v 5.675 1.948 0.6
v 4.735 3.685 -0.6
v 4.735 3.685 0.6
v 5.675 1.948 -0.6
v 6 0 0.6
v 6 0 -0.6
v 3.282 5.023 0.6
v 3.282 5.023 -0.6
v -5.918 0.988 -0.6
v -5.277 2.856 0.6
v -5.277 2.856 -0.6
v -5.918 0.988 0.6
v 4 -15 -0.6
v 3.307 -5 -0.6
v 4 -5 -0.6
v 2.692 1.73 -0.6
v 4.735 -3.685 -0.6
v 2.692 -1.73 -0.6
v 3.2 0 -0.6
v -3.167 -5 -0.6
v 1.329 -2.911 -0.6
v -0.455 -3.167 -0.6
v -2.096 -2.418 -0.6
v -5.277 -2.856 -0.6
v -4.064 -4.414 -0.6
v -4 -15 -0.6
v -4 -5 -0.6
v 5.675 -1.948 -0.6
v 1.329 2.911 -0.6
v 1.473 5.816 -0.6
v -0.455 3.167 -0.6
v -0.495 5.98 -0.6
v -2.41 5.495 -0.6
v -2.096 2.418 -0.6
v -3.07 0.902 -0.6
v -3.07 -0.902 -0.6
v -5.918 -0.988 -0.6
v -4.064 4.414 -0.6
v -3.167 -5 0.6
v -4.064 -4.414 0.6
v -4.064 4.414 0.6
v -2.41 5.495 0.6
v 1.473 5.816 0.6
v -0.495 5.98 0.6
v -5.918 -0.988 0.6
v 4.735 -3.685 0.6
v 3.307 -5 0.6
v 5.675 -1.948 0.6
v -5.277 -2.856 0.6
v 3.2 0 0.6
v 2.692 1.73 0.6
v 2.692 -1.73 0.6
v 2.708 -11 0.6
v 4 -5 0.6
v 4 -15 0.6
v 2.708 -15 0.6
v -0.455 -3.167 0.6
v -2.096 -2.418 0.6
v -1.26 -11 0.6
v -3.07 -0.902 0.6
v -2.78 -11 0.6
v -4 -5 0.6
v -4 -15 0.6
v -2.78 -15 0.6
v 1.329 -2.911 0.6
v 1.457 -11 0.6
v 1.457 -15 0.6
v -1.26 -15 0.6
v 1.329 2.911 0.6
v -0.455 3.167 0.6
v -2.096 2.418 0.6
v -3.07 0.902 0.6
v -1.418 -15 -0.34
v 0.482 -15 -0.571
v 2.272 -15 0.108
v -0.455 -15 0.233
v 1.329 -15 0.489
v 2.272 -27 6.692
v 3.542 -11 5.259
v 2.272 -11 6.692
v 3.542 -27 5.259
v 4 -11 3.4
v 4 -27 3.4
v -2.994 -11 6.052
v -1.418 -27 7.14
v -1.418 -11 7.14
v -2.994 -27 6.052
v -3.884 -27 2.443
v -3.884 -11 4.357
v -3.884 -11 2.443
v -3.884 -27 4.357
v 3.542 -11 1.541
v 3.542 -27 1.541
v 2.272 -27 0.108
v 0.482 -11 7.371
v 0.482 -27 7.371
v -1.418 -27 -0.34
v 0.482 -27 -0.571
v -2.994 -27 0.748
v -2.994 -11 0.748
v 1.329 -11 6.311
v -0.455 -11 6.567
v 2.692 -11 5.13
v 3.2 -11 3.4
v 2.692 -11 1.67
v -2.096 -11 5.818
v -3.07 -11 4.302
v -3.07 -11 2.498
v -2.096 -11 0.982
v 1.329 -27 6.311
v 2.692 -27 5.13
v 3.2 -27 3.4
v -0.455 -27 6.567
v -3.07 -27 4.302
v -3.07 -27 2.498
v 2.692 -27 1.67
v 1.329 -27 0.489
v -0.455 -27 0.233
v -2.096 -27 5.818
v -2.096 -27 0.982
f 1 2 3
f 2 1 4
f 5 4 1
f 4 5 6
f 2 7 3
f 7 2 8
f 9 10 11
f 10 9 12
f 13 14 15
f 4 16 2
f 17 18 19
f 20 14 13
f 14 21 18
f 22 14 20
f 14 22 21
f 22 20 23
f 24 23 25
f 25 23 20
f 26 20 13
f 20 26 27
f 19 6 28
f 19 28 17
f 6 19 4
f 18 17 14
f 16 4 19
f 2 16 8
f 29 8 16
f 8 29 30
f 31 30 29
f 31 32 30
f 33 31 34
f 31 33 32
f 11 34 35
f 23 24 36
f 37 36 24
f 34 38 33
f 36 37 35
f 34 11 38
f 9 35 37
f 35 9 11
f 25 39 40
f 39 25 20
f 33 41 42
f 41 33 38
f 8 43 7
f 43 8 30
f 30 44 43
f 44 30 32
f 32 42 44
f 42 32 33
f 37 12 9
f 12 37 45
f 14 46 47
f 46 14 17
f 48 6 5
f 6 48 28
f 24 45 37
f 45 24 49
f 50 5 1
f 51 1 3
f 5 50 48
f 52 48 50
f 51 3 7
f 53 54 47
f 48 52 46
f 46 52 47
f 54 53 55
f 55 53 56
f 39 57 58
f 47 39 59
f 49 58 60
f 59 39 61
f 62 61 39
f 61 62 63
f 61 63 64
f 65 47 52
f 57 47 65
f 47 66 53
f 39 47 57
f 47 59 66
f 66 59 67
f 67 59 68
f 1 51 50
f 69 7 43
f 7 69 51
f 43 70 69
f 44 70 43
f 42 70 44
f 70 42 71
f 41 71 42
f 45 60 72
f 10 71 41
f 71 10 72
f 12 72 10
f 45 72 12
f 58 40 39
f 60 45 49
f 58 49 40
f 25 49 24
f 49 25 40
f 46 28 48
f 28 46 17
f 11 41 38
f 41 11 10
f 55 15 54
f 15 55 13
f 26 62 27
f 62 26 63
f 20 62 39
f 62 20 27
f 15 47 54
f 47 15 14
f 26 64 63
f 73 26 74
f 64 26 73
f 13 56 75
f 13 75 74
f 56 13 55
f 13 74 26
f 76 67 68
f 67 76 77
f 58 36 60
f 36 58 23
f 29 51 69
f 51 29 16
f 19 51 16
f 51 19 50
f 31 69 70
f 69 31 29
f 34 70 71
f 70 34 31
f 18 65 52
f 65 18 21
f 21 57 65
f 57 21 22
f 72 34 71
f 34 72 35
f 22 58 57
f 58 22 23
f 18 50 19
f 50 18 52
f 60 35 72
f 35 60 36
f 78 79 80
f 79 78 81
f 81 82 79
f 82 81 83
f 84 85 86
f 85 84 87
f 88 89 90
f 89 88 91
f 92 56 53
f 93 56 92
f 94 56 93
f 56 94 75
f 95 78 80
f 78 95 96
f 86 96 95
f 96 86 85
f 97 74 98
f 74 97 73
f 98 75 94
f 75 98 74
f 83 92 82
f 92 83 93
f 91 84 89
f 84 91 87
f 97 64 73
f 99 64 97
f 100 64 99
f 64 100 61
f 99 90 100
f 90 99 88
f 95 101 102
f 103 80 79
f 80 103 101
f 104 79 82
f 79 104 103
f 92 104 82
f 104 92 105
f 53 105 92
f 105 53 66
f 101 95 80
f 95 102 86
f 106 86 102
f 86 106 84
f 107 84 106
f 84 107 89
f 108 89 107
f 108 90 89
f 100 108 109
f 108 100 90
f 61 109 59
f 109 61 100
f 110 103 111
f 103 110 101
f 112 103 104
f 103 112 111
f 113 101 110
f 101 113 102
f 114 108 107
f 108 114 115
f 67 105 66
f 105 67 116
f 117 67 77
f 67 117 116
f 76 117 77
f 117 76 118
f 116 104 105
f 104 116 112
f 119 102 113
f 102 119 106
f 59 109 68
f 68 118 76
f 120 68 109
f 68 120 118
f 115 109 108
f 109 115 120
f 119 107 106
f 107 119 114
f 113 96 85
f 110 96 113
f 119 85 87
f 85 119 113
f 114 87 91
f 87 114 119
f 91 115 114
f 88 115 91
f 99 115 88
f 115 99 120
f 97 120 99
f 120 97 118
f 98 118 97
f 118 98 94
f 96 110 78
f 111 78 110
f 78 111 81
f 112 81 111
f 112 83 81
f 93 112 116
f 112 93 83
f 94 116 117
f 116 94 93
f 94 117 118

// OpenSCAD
// Parameters
outer_diameter_od = 12; //[6:24:0.5]
inner_diameter_id = 6.4; //[3.2:12.8:0.1]
thickness_t = 1.2; //[0.6:2.4:0.1]
width_w = 8; //[4:16:0.5]
overall_length_l = 30; //[15:60:1]
crimp_length = 12; //[6:24:1]
crimp_enabled = 1; //[0:1:1]
aux_hole_diameter = 3; //[0:6:0.1]
bend_angle_deg = 45; //[0:90:1]
transition_length = 2; //[1:6:0.5]
overlap_eps = 1; //[0.5:2:0.1]
ring_to_neck_length = 10; //[5:20:0.5]
barrel_wall = 0.8; //[0.4:1.6:0.1]
strain_relief_length = 4; //[2:10:0.5]

// Ring Terminal - complete geometry
module ring_terminal() {
  color("Silver") {
    // Ring Lug Plate with Hole
    difference() {
      union() {
        translate([0, 0, 0])
          cylinder(r=outer_diameter_od/2, h=thickness_t, center=true);
        translate([0, -(outer_diameter_od/2 + ring_to_neck_length/2 - overlap_eps), 0])
          cube([width_w, ring_to_neck_length, thickness_t], center=true);
      }
      translate([0, 0, 0])
        cylinder(r=inner_diameter_id/2, h=thickness_t + 2*overlap_eps, center=true);
    }
    
    // Crimp Barrel or Bent Tab
    if (crimp_enabled) {
      // Crimp Barrel
      union() {
        difference() {
          translate([0, -(outer_diameter_od/2 + ring_to_neck_length + transition_length - overlap_eps), width_w/2 - thickness_t/2])
            rotate([90, 0, 0])
            cylinder(r=width_w/2, h=crimp_length, center=true);
          translate([0, -(outer_diameter_od/2 + ring_to_neck_length + transition_length - overlap_eps), width_w/2 - thickness_t/2])
            rotate([90, 0, 0])
            cylinder(r=width_w/2 - barrel_wall, h=crimp_length + 2*overlap_eps, center=true);
        }
        difference() {
          translate([0, -(outer_diameter_od/2 + ring_to_neck_length + transition_length + crimp_length/2 + strain_relief_length/2 - overlap_eps), width_w/2 - thickness_t/2])
            rotate([90, 0, 0])
            cylinder(r=width_w/2, h=strain_relief_length, center=true);
          translate([0, -(outer_diameter_od/2 + ring_to_neck_length + transition_length + crimp_length/2 + strain_relief_length/2 - overlap_eps), width_w/2 - thickness_t/2])
            rotate([90, 0, 0])
            cylinder(r=width_w/2 - barrel_wall, h=strain_relief_length + 2*overlap_eps, center=true);
        }
      }
    } else {
      // Bent Tab
      union() {
        translate([0, -(outer_diameter_od/2 + ring_to_neck_length + transition_length + (overall_length_l - outer_diameter_od/2 - ring_to_neck_length - transition_length)/2 - overlap_eps), 0])
          cube([width_w, overall_length_l - outer_diameter_od/2 - ring_to_neck_length - transition_length, thickness_t], center=true);
        translate([0, -(outer_diameter_od/2 + ring_to_neck_length + transition_length/2 - overlap_eps), thickness_t/2 - overlap_eps])
          rotate([bend_angle_deg, 0, 0])
          cube([width_w, transition_length, thickness_t], center=true);
        if (aux_hole_diameter > 0) {
          translate([0, -(overall_length_l - width_w/2), 0])
            cylinder(r=aux_hole_diameter/2, h=thickness_t + 2*overlap_eps, center=true);
        }
      }
    }
  }
}

// Ring Terminal Assembly - complete geometry
module ring_terminal_assembly() {
  ring_terminal();
}

// Assembly
module assembly() {
  ring_terminal_assembly();
}

assembly();
